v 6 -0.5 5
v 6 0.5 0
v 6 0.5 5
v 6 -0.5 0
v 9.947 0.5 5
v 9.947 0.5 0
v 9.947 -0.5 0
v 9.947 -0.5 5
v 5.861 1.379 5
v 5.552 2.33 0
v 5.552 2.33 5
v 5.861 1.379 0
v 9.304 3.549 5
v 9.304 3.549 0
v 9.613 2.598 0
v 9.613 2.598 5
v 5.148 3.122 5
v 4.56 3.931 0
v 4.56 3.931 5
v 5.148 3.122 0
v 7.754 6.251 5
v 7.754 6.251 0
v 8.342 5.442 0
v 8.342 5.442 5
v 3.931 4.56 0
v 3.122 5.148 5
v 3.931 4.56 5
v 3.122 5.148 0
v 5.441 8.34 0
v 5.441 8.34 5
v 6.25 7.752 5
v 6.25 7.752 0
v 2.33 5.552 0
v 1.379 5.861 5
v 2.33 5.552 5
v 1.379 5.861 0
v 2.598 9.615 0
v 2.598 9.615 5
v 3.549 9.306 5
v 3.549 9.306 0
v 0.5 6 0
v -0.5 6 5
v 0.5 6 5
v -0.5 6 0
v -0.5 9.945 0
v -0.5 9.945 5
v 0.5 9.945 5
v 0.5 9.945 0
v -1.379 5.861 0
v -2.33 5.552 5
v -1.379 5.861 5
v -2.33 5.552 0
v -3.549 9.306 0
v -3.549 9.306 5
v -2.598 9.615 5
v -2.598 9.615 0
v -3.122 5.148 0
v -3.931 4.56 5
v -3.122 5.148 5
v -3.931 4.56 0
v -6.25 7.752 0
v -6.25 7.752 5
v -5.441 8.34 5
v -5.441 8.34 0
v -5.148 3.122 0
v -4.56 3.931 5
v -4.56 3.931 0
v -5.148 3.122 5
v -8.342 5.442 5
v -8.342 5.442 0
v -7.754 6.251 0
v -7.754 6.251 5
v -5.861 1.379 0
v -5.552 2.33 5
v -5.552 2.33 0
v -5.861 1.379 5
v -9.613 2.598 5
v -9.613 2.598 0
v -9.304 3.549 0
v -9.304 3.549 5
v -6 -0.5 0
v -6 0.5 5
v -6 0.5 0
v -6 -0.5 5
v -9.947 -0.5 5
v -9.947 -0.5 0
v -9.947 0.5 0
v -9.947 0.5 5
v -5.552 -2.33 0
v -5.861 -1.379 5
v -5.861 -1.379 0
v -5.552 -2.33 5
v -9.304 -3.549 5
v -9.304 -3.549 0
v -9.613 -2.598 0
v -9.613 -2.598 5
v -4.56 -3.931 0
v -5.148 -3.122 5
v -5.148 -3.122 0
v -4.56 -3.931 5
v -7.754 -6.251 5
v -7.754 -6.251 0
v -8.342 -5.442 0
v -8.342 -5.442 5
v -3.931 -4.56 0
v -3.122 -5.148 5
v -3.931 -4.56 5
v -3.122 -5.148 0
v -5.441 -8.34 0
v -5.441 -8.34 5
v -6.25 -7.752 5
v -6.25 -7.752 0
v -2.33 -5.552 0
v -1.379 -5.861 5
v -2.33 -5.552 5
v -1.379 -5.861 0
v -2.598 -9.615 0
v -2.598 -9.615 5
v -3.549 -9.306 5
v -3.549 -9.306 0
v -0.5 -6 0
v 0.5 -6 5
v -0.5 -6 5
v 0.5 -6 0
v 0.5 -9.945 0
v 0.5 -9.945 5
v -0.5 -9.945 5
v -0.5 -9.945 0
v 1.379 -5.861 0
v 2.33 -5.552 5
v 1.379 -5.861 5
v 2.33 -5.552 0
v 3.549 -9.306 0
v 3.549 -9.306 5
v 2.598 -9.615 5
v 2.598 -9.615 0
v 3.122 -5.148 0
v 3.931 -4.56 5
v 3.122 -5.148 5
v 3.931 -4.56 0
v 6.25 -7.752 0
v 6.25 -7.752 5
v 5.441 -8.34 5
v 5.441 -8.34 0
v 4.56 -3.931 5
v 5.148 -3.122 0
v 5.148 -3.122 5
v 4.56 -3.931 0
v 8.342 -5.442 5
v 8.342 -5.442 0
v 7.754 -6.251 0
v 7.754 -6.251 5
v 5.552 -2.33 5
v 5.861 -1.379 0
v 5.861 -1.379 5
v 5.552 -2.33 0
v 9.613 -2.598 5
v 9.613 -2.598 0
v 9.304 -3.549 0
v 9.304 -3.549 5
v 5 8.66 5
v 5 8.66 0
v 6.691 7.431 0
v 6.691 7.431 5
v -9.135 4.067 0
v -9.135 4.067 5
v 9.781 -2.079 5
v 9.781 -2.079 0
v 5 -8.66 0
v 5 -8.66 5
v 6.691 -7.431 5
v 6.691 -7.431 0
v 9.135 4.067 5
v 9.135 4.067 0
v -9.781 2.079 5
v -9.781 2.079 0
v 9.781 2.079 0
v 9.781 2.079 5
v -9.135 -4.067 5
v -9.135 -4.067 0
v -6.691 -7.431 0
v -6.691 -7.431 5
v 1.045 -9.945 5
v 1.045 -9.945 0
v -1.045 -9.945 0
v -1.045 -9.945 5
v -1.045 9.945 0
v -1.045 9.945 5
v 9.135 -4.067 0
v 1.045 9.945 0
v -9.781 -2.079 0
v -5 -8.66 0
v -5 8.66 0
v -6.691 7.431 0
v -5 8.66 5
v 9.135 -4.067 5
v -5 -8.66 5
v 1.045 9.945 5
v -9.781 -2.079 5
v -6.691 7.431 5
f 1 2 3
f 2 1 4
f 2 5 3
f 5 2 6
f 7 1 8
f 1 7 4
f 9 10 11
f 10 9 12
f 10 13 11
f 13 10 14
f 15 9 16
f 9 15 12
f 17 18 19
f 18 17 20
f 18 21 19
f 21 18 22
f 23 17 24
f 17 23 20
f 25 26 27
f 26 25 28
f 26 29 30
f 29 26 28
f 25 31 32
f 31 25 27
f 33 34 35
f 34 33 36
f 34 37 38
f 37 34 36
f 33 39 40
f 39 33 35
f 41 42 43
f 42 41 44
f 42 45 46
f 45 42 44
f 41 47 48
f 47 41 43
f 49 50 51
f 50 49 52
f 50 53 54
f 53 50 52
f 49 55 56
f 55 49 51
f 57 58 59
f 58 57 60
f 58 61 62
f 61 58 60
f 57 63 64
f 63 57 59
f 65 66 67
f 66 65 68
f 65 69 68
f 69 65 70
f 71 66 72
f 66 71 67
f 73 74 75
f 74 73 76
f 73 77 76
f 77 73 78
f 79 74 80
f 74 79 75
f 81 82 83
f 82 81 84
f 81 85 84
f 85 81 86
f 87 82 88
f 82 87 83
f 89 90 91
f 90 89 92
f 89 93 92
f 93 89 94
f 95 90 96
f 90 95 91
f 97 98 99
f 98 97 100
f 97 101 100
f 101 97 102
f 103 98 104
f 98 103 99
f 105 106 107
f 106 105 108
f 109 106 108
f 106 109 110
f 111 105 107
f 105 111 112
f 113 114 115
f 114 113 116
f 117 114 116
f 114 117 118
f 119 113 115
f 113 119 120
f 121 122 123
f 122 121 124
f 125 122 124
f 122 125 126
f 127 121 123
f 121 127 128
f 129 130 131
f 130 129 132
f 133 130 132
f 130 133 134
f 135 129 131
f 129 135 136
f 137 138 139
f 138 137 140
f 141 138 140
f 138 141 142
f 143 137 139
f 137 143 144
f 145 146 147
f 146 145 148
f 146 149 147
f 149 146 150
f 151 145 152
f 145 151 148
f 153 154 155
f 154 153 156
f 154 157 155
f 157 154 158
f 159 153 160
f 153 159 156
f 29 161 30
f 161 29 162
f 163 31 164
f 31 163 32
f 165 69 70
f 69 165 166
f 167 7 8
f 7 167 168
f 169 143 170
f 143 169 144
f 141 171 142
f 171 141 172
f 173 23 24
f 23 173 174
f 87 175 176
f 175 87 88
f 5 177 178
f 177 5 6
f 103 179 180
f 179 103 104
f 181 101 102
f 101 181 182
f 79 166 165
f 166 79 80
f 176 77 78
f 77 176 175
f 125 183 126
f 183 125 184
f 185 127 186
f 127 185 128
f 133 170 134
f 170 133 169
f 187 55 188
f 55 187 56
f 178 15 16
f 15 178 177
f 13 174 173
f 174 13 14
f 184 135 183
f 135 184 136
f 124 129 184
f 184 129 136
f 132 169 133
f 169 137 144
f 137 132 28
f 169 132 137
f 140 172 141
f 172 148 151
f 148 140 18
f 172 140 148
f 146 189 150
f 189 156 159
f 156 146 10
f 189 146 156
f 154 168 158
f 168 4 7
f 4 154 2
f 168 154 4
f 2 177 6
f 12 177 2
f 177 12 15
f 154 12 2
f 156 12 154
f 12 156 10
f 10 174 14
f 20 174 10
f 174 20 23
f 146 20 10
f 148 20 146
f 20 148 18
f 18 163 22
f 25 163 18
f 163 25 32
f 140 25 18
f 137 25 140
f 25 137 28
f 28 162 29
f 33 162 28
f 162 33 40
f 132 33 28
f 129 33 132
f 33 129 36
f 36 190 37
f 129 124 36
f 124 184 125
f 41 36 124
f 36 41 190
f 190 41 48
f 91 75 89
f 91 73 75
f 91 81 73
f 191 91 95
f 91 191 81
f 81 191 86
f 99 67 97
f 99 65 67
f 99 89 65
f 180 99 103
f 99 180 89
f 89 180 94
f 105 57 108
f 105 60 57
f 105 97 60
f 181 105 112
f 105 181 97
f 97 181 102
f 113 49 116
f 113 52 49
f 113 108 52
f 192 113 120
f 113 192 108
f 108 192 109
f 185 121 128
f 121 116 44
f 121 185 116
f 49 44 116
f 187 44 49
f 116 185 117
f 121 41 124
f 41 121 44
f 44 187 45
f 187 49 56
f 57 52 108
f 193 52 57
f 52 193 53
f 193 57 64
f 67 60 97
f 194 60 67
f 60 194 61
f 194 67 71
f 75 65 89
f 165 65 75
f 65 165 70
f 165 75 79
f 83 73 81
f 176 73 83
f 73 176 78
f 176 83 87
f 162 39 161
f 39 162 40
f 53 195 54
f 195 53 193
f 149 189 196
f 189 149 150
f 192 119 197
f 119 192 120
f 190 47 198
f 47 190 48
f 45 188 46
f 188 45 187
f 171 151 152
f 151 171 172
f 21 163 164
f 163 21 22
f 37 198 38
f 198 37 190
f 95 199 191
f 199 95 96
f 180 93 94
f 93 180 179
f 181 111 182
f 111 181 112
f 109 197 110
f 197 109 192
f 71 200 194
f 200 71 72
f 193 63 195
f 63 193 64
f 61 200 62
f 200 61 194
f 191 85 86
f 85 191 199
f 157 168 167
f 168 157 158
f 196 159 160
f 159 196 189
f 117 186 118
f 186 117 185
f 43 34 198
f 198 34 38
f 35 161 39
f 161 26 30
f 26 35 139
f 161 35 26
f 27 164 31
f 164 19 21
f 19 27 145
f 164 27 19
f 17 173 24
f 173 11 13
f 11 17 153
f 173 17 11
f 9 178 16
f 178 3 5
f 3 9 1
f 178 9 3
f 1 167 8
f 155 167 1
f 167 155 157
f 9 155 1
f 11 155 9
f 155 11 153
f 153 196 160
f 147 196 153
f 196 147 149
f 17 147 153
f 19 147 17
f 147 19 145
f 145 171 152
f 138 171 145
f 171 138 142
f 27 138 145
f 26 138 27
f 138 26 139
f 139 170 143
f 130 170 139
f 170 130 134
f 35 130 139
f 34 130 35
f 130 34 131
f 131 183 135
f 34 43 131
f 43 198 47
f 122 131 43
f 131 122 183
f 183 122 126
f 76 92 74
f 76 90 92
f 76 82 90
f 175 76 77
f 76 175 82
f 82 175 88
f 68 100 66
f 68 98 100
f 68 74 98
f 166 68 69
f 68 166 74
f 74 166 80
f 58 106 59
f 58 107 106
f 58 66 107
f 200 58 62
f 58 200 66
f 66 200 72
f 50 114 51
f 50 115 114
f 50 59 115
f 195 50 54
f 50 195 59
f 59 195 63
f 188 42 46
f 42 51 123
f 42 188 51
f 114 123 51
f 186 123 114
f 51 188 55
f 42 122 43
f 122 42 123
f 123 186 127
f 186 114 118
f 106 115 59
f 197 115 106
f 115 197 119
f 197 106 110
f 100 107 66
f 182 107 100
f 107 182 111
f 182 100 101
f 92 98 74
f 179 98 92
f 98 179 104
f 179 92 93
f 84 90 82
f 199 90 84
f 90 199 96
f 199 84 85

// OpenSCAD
radius = 10;
height = 5;
n_rays = 20;
ray_width = 1;
ray_depth = 4;

difference() {
    cylinder(r = radius, h = height);
    
    for(i=[0:n_rays]) {
        rotate([0, 0, i * (360 / n_rays)]) {
            translate([radius - ray_depth / 2, 0, height / 2]) {
                cube([ray_depth, ray_width, height + 2], center = true);
            }
        }
    }
}
